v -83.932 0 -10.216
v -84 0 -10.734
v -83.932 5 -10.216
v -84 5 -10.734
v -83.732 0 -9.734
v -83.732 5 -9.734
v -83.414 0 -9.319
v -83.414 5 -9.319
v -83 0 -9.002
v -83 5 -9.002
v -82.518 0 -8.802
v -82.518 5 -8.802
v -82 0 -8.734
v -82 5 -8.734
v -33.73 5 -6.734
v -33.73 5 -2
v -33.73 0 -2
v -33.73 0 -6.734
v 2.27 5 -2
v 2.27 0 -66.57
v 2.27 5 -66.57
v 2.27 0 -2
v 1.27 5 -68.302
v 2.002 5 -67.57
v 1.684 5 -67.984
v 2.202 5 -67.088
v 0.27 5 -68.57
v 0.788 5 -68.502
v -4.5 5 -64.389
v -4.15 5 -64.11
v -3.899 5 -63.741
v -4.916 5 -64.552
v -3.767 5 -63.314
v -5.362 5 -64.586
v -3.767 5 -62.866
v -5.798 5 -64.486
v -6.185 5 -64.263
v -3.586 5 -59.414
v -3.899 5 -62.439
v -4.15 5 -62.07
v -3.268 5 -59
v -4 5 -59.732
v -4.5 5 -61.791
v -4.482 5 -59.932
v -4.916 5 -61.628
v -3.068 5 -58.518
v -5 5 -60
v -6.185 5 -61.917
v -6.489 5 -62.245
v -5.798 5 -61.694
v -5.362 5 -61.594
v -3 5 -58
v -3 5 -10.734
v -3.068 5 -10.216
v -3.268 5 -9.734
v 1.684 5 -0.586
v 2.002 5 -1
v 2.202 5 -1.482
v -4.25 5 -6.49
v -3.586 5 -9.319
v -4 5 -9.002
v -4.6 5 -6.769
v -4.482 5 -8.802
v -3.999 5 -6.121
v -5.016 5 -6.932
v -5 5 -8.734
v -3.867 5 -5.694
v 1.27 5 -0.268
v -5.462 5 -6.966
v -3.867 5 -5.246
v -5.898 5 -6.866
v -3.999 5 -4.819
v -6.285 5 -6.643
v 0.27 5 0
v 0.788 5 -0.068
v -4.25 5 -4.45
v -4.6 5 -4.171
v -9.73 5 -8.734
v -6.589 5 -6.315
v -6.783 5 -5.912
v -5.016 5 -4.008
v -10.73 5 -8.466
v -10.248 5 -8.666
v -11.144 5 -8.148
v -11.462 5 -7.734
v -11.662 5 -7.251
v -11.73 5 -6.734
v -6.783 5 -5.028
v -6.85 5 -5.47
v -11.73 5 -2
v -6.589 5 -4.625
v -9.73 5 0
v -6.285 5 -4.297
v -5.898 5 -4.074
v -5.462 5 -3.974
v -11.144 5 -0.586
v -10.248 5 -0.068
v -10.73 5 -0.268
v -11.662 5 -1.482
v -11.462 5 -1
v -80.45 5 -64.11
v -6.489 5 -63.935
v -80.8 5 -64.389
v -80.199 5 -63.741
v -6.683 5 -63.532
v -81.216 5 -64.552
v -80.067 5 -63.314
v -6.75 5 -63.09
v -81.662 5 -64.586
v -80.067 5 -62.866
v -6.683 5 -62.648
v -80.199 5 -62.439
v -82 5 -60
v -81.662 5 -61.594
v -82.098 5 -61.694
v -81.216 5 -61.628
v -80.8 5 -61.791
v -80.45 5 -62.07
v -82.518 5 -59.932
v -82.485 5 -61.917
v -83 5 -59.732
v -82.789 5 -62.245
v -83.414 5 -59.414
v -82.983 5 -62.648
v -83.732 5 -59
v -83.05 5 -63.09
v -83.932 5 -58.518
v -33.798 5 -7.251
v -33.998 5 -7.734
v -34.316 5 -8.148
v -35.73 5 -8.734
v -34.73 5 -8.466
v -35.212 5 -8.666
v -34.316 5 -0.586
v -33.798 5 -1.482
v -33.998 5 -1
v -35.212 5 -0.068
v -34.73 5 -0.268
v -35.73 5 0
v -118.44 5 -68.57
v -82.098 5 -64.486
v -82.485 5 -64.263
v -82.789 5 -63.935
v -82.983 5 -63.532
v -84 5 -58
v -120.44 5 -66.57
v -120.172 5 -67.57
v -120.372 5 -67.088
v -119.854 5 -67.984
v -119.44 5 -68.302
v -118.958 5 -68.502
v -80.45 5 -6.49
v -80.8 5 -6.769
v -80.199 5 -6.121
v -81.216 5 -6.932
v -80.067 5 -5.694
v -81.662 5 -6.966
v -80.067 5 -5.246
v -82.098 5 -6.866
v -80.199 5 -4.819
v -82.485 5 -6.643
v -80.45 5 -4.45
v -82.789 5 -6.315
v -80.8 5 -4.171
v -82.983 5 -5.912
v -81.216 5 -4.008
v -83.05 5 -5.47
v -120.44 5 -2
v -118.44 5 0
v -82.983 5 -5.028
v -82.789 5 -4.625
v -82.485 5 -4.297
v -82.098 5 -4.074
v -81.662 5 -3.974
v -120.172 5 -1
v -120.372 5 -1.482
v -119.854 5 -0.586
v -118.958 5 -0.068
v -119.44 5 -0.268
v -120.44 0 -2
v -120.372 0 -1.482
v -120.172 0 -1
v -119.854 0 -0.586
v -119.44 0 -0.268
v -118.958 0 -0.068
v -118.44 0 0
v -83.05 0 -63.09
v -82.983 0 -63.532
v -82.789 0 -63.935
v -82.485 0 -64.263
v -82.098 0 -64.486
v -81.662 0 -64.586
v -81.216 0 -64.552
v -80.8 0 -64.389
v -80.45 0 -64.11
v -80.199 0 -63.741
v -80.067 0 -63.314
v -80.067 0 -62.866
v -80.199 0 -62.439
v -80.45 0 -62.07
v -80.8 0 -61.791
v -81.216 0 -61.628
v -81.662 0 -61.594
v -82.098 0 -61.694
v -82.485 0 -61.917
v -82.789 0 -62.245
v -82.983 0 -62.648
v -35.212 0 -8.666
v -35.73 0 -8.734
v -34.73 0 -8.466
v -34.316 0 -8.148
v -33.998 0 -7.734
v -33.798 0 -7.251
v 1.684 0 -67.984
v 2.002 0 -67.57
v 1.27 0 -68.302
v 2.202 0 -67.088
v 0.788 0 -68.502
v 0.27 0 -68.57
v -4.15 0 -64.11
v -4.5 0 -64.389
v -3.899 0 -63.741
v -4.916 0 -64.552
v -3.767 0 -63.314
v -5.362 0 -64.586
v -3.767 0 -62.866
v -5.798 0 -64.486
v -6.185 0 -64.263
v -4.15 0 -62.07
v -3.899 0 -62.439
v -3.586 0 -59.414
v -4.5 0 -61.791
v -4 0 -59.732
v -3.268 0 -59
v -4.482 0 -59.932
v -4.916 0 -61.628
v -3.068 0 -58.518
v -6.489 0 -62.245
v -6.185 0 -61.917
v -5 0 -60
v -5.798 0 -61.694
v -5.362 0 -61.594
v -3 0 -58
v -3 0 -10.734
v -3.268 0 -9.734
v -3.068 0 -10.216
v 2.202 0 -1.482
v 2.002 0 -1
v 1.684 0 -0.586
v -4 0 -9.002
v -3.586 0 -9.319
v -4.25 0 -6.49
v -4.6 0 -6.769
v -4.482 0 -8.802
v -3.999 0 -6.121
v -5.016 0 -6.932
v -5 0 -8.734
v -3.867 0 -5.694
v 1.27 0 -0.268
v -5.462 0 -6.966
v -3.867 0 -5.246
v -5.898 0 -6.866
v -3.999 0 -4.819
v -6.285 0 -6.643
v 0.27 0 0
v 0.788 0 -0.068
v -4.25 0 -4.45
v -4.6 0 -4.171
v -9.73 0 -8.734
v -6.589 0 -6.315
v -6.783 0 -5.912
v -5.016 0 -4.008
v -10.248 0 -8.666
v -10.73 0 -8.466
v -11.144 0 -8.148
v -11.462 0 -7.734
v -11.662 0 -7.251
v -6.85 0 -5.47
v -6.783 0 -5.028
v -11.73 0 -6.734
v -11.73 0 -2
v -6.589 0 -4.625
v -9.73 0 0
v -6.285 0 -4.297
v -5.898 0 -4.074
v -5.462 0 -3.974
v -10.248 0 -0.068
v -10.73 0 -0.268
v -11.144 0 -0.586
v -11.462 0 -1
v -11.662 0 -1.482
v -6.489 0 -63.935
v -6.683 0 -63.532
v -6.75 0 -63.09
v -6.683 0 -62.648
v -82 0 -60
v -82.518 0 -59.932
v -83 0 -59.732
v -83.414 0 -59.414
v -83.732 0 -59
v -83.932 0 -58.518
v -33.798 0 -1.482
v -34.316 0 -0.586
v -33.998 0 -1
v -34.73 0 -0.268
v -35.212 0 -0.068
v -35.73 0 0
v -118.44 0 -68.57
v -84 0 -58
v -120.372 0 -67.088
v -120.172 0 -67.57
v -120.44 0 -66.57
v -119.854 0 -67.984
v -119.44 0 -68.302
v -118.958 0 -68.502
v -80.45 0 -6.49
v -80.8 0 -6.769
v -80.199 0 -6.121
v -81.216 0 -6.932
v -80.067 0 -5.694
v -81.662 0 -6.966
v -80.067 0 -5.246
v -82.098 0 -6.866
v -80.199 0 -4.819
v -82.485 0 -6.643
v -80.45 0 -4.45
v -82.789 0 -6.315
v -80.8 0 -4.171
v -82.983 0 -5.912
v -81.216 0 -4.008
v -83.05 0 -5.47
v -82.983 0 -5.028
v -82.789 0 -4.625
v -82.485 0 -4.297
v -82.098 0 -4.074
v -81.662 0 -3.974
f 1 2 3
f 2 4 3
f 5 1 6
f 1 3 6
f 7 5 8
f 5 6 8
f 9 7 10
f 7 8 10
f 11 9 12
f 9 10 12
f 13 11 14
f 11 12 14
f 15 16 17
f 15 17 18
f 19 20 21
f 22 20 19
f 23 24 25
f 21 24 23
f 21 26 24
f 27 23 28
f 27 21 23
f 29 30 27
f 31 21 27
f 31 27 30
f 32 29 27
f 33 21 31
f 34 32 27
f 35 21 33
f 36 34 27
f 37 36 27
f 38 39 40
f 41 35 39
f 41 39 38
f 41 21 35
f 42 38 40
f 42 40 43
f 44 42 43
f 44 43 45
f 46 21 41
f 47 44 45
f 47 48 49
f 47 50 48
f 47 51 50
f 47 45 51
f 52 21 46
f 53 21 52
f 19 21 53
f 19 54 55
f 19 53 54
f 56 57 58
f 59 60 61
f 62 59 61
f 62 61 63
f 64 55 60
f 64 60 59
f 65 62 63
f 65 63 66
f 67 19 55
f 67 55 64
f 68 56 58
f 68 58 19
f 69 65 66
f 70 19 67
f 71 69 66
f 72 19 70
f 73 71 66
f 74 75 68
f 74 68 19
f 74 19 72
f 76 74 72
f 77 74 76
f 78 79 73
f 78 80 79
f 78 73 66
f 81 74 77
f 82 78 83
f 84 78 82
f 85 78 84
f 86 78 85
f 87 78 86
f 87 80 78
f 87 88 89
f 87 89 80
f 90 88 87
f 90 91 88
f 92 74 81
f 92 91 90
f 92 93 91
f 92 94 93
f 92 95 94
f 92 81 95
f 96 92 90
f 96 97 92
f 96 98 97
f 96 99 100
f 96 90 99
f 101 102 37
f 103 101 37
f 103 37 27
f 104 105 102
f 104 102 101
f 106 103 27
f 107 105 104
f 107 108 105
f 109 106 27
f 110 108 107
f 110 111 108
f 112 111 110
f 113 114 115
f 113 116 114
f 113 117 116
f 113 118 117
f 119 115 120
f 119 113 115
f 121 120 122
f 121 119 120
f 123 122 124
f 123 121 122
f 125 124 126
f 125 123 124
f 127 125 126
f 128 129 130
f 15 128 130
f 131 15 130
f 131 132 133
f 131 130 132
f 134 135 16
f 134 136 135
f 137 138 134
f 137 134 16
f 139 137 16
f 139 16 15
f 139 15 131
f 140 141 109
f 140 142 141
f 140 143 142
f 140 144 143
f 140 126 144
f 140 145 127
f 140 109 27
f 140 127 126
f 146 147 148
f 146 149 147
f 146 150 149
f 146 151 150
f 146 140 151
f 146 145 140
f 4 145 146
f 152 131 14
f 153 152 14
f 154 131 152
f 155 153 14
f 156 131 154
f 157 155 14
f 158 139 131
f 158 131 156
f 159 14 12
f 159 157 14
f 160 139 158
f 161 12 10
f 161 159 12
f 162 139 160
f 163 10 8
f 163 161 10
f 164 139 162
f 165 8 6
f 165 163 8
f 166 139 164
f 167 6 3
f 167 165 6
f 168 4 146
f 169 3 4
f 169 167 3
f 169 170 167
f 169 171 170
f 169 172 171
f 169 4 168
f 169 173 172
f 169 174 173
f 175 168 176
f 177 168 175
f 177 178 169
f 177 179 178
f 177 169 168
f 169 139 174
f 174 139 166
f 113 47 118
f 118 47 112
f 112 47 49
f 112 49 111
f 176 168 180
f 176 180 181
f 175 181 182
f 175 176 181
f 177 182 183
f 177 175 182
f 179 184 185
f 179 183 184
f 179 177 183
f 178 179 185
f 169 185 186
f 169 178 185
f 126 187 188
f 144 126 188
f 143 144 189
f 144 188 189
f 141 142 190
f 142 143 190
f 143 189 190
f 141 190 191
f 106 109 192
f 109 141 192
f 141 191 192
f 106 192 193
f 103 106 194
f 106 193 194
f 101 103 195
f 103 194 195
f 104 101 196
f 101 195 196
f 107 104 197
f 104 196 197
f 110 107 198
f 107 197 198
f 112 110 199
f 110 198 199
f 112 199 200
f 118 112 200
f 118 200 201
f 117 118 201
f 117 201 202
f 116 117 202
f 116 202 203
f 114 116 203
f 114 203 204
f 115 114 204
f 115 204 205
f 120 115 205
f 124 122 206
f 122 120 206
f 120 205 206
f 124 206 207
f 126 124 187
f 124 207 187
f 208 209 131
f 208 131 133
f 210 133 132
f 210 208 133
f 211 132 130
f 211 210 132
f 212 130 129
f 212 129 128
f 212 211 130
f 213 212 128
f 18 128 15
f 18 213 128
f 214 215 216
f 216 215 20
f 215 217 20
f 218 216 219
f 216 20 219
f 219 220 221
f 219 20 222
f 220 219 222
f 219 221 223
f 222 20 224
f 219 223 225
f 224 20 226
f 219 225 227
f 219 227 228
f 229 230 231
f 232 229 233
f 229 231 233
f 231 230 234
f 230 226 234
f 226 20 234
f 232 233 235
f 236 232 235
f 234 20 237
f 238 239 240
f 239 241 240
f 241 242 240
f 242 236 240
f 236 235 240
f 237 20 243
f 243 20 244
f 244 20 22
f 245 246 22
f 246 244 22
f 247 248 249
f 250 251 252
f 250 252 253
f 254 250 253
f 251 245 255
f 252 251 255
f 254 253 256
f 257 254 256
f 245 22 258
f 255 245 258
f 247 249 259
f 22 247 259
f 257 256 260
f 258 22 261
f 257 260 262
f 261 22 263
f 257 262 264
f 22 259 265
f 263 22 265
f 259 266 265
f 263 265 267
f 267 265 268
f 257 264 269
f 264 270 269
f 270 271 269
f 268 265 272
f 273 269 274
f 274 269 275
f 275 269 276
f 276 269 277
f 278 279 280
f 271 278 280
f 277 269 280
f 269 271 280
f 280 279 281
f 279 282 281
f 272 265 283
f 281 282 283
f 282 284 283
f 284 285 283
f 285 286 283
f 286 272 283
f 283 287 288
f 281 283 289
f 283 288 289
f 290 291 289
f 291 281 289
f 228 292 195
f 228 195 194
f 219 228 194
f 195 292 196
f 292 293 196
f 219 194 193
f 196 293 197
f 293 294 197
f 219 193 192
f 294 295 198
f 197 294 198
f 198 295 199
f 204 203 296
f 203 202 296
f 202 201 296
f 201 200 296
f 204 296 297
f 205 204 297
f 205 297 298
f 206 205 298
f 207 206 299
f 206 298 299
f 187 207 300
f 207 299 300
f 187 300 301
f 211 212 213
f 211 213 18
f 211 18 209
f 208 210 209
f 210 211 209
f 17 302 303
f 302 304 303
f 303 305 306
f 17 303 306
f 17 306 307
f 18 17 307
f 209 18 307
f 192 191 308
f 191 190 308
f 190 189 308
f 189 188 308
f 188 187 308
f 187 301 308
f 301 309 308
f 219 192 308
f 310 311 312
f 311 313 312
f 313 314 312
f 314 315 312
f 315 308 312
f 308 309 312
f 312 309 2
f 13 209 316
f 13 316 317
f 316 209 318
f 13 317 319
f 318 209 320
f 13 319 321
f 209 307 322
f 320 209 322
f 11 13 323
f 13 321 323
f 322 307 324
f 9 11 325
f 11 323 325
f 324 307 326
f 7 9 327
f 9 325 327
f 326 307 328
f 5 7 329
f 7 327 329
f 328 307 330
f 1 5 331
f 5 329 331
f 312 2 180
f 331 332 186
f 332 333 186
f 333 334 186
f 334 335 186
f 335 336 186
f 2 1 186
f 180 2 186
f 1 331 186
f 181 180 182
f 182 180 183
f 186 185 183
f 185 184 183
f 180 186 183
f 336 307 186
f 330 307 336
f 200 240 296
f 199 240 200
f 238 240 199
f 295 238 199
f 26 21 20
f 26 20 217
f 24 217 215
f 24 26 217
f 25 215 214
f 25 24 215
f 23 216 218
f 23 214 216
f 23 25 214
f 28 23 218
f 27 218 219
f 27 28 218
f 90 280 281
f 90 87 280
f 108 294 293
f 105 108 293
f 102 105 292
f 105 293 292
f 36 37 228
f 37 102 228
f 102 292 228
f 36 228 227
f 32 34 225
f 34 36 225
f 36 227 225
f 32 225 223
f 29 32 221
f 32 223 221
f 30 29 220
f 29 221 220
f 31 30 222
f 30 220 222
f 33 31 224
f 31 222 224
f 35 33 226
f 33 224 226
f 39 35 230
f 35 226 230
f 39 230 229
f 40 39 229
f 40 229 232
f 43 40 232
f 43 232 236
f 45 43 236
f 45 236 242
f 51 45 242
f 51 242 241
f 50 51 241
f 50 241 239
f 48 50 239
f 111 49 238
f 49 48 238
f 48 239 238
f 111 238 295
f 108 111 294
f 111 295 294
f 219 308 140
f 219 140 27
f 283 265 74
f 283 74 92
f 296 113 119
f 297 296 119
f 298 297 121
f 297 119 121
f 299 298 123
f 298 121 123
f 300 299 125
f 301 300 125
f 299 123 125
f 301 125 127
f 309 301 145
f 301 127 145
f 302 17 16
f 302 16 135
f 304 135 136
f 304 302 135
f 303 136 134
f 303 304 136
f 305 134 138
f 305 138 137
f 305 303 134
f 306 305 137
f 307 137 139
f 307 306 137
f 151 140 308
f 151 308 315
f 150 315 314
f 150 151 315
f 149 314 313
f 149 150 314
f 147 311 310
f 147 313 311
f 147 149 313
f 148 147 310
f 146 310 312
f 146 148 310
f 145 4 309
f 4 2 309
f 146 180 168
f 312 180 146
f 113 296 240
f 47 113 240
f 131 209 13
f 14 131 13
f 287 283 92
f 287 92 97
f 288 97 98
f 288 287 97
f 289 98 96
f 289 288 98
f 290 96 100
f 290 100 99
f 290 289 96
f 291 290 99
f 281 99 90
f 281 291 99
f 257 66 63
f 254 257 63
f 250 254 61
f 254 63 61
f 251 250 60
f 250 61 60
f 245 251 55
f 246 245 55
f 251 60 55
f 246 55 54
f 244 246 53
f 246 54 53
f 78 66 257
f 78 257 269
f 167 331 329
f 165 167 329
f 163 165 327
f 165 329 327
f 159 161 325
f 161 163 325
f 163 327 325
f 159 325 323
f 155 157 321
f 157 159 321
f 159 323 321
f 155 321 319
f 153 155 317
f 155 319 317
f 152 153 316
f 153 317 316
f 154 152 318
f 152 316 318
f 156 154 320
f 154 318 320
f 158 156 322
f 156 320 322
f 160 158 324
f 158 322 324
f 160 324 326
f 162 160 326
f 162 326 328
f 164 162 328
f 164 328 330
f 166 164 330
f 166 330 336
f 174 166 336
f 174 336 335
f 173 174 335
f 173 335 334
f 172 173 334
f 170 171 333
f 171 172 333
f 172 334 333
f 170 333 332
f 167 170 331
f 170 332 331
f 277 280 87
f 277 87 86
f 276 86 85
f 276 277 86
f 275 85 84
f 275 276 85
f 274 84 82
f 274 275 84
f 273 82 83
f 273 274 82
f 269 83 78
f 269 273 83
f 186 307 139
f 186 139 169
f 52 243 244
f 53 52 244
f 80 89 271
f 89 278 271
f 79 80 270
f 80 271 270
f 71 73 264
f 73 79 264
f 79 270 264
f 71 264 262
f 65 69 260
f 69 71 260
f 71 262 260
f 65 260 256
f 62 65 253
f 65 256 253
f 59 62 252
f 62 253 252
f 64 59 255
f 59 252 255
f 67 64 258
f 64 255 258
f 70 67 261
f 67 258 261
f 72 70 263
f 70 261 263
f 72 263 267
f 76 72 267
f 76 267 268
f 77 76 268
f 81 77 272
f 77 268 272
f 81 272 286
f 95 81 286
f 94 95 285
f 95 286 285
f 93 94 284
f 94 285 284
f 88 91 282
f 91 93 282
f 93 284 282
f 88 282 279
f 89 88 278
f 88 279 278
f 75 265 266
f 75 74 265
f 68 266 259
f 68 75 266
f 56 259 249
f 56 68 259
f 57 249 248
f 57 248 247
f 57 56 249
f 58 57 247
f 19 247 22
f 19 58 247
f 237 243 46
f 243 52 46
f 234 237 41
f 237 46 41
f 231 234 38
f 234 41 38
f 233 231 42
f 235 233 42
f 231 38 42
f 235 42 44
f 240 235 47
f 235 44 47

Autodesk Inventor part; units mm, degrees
ref_plane "YZ Plane" through (0, 0, 0) normal (1, 0, 0) x (0, 1, 0)
ref_plane "XZ Plane" through (0, 0, 0) normal (0, 1, 0) x (-1, 0, 0)
ref_plane "XY Plane" through (0, 0, 0) normal (0, 0, 1) x (1, 0, 0)
sketch "Sketch1" plane through (0, 0, 0) normal (0, 1, 0) x (-1, 0, 0)
  line L0 (-2.27, 0) -> (120.44, 0)
  line L1 (120.44, 0) -> (120.44, -68.57)
  line L2 (120.44, -68.57) -> (-2.27, -68.57)
  line L3 (-2.27, -68.57) -> (-2.27, 0)
  line L4 (120.44, -66.57) -> (120.44, -2)
  line L5 (0, -68.57) -> (118.44, -68.57)
  line L6 (-2.27, -2.27) -> (-2.27, -66.3)
  circle A0 centre (81.55, -63.09) radius 1.5
  circle A1 centre (81.55, -63.09) radius 1.5
  line L7 (70.44, -68.57) -> (15.73, -68.57)
  line L8 (51, 0) -> (75, 0)
  line L9 (26, 0) -> (51, 0)
  line L10 (84, -60) -> (79, -60)
  line L11 (79, -60) -> (79, -8.7337)
  line L12 (79, -8.7337) -> (84, -8.7337)
  line L13 (84, -8.7337) -> (84, -60)
  line L14 (8, -60) -> (3, -60)
  line L15 (3, -60) -> (3, -8.7337)
  line L16 (3, -8.7337) -> (8, -8.7337)
  line L17 (8, -8.7337) -> (8, -60)
  circle A2 centre (5.25, -63.09) radius 1.5
  circle A3 centre (5.35, -5.47) radius 1.5
  circle A4 centre (81.55, -5.47) radius 1.5
  circle A5 centre (81.55, -5.47) radius 1.5
  circle A6 centre (5.35, -5.47) radius 1.5
  circle A7 centre (5.25, -63.09) radius 1.5
  dimension "d20" = 3
  dimension "d27" = 3
  dimension "d28" = 3
  dimension "d29" = 3
  dimension "d30" = 68.57
extrude "Extrusion1" add sketch "Sketch1" along normal blind 5
fillet "Fillet4" radius 2 4 edges at (-120.44, 2.5, -68.57) (-120.44, 2.5, 0) (2.27, 2.5, -68.57) (2.27, 2.5, 0)
sketch "Sketch7" plane through (0, 5, 0) normal (0, 1, 0) x (1, 0, 0)
  line L0 (-117.44, 63.57) -> (-87.44, 63.57)
  line L1 (-87.44, 63.57) -> (-87.44, 5)
  line L2 (-87.44, 5) -> (-117.44, 5)
  line L3 (-117.44, 5) -> (-117.44, 63.57)
  line L4 (-120.44, 66.57) -> (-120.44, 2) projected
  line L5 (0.27, 68.57) -> (-118.44, 68.57) projected
  line L6 (-118.44, 0) -> (0.27, 0) projected
  point P0 (0, 0)
  dimension "d67" = 30
  dimension "d68" = 3
  dimension "d69" = 5
  dimension "d70" = 5
extrude "Extrusion6" [suppressed]
fillet "Fillet8" [suppressed]
sketch "Sketch8" plane through (0, 5, 0) normal (0, 1, 0) x (1, 0, 0)
  line L0 (-79, 60) -> (-8, 60)
  line L1 (-8, 60) -> (-8, 8.7337)
  line L2 (-8, 8.7337) -> (-79, 8.7337)
  line L3 (-79, 8.7337) -> (-79, 60)
  line L4 (-8, 8.7337) -> (-8, 60) projected
  line L5 (0.27, 68.57) -> (-118.44, 68.57) projected
  line L6 (-79, 60) -> (-79, 8.7337) projected
  line L7 (-3, 8.7337) -> (-8, 8.7337) projected
  line L8 (-8, 60) -> (-3, 60) projected
  point P0 (0, 0)
extrude "Extrusion7" cut sketch "Sketch8" against normal blind 10
sketch "Sketch9" plane through (0, 5, 0) normal (0, 1, 0) x (1, 0, 0)
  line L0 (-3, 8.7337) -> (-84, 8.7337) projected
  line L1 (-118.44, 0) -> (0.27, 0) projected
  line L2 (-33.73, 8.7337) -> (-11.73, 8.7337)
  line L3 (-11.73, 8.7337) -> (-11.73, 0)
  line L4 (-11.73, 0) -> (-33.73, 0)
  line L5 (-33.73, 0) -> (-33.73, 8.7337)
  line L6 (2.27, 2) -> (2.27, 66.57) projected
  point P0 (0, 0)
  point P1 (-79, 8.57)
  point P2 (-8, 8.57)
  point P3 (-33.73, 0)
  point P4 (-11.73, 8.57)
  point P5 (-11.73, 8.7337)
  point P6 (-79, 8.871)
  point P7 (-8, 8.871)
  point P8 (-11.73, 8.871)
  point P9 (-11.73, 8.7337)
  dimension "d78" = 22
  dimension "d81" = 14
  dimension "d82" = 8.7338
extrude "Extrusion8" cut sketch "Sketch9" against normal blind 5
fillet "Fillet9" radius 2 8 edges at (-84, 2.5, -60) (-3, 2.5, -60) (-3, 2.5, -8.7337) (-11.73, 2.5, -8.7337) (-11.73, 2.5, 0) (-33.73, 2.5, -8.7337) (-33.73, 2.5, 0) (-84, 2.5, -8.7337)
properties part number "Top PMMA"
